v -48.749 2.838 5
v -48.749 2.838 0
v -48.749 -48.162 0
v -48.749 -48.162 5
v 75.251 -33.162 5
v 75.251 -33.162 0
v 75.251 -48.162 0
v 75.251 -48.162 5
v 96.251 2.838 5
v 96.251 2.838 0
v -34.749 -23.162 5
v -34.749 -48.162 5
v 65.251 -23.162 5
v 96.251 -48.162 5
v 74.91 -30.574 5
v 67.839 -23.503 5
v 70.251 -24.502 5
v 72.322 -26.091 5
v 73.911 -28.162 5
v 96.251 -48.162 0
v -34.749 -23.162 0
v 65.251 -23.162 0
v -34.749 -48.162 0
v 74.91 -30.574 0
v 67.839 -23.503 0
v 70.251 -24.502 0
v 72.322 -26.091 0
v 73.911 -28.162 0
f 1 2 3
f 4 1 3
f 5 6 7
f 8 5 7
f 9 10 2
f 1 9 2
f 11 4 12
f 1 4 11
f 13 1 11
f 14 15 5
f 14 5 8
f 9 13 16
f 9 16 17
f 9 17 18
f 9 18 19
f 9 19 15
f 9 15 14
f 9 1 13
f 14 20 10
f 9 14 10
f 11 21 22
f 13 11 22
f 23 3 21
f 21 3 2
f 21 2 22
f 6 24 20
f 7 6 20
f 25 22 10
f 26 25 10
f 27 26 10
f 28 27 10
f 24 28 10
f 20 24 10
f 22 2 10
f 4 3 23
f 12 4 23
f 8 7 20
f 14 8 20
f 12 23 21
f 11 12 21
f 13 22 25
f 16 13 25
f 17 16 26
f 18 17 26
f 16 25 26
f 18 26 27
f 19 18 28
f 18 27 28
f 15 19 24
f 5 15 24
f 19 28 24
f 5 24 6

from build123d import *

# Parameters (mm, degrees)
EXTRUSION1_DEPTH = 5
EXTRUSION2_REACH = 109.744


with BuildPart() as part:
    # Esquisse1 → Extrusion1 (new body)
    with BuildSketch(Plane.XY):
        Polygon((-48.749448329, -48.162307692), (-34.749448329, -48.162307692), (-34.749448329, -23.162307692), (25.250551671, -23.162307692), (25.250551671, -48.162307692), (96.250551671, -48.162307692), (96.250551671, 2.837692308), (-48.749448329, 2.837692308), align=None)
    extrude(amount=EXTRUSION1_DEPTH)

    # Esquisse3 → Extrusion2 (cut, up to next)
    with BuildSketch(Plane(origin=(0, 0, 0), x_dir=(-1, 0, 0), z_dir=(0, 0, -1)), mode=Mode.PRIVATE) as extrusion2_sk1:
        with BuildLine():
            Line((-25.250551671, -23.162307692), (-65.250551671, -23.162307692))
            ThreePointArc((-65.250551671, -23.162307692), (-72.321619482, -26.09123988), (-75.250551671, -33.162307692))
            Line((-75.250551671, -33.162307692), (-75.250551671, -48.162307692))
            Line((-75.250551671, -48.162307692), (-25.250551671, -48.162307692))
            Line((-25.250551671, -48.162307692), (-25.250551671, -23.162307692))
        make_face()
    extrusion2_tool1 = extrude(extrusion2_sk1.sketch, amount=-EXTRUSION2_REACH, mode=Mode.PRIVATE) & part.part
    add(extrusion2_tool1.solids().sort_by_distance((49.852869, -35.84164, 0))[0], mode=Mode.SUBTRACT)


solid = part.part
